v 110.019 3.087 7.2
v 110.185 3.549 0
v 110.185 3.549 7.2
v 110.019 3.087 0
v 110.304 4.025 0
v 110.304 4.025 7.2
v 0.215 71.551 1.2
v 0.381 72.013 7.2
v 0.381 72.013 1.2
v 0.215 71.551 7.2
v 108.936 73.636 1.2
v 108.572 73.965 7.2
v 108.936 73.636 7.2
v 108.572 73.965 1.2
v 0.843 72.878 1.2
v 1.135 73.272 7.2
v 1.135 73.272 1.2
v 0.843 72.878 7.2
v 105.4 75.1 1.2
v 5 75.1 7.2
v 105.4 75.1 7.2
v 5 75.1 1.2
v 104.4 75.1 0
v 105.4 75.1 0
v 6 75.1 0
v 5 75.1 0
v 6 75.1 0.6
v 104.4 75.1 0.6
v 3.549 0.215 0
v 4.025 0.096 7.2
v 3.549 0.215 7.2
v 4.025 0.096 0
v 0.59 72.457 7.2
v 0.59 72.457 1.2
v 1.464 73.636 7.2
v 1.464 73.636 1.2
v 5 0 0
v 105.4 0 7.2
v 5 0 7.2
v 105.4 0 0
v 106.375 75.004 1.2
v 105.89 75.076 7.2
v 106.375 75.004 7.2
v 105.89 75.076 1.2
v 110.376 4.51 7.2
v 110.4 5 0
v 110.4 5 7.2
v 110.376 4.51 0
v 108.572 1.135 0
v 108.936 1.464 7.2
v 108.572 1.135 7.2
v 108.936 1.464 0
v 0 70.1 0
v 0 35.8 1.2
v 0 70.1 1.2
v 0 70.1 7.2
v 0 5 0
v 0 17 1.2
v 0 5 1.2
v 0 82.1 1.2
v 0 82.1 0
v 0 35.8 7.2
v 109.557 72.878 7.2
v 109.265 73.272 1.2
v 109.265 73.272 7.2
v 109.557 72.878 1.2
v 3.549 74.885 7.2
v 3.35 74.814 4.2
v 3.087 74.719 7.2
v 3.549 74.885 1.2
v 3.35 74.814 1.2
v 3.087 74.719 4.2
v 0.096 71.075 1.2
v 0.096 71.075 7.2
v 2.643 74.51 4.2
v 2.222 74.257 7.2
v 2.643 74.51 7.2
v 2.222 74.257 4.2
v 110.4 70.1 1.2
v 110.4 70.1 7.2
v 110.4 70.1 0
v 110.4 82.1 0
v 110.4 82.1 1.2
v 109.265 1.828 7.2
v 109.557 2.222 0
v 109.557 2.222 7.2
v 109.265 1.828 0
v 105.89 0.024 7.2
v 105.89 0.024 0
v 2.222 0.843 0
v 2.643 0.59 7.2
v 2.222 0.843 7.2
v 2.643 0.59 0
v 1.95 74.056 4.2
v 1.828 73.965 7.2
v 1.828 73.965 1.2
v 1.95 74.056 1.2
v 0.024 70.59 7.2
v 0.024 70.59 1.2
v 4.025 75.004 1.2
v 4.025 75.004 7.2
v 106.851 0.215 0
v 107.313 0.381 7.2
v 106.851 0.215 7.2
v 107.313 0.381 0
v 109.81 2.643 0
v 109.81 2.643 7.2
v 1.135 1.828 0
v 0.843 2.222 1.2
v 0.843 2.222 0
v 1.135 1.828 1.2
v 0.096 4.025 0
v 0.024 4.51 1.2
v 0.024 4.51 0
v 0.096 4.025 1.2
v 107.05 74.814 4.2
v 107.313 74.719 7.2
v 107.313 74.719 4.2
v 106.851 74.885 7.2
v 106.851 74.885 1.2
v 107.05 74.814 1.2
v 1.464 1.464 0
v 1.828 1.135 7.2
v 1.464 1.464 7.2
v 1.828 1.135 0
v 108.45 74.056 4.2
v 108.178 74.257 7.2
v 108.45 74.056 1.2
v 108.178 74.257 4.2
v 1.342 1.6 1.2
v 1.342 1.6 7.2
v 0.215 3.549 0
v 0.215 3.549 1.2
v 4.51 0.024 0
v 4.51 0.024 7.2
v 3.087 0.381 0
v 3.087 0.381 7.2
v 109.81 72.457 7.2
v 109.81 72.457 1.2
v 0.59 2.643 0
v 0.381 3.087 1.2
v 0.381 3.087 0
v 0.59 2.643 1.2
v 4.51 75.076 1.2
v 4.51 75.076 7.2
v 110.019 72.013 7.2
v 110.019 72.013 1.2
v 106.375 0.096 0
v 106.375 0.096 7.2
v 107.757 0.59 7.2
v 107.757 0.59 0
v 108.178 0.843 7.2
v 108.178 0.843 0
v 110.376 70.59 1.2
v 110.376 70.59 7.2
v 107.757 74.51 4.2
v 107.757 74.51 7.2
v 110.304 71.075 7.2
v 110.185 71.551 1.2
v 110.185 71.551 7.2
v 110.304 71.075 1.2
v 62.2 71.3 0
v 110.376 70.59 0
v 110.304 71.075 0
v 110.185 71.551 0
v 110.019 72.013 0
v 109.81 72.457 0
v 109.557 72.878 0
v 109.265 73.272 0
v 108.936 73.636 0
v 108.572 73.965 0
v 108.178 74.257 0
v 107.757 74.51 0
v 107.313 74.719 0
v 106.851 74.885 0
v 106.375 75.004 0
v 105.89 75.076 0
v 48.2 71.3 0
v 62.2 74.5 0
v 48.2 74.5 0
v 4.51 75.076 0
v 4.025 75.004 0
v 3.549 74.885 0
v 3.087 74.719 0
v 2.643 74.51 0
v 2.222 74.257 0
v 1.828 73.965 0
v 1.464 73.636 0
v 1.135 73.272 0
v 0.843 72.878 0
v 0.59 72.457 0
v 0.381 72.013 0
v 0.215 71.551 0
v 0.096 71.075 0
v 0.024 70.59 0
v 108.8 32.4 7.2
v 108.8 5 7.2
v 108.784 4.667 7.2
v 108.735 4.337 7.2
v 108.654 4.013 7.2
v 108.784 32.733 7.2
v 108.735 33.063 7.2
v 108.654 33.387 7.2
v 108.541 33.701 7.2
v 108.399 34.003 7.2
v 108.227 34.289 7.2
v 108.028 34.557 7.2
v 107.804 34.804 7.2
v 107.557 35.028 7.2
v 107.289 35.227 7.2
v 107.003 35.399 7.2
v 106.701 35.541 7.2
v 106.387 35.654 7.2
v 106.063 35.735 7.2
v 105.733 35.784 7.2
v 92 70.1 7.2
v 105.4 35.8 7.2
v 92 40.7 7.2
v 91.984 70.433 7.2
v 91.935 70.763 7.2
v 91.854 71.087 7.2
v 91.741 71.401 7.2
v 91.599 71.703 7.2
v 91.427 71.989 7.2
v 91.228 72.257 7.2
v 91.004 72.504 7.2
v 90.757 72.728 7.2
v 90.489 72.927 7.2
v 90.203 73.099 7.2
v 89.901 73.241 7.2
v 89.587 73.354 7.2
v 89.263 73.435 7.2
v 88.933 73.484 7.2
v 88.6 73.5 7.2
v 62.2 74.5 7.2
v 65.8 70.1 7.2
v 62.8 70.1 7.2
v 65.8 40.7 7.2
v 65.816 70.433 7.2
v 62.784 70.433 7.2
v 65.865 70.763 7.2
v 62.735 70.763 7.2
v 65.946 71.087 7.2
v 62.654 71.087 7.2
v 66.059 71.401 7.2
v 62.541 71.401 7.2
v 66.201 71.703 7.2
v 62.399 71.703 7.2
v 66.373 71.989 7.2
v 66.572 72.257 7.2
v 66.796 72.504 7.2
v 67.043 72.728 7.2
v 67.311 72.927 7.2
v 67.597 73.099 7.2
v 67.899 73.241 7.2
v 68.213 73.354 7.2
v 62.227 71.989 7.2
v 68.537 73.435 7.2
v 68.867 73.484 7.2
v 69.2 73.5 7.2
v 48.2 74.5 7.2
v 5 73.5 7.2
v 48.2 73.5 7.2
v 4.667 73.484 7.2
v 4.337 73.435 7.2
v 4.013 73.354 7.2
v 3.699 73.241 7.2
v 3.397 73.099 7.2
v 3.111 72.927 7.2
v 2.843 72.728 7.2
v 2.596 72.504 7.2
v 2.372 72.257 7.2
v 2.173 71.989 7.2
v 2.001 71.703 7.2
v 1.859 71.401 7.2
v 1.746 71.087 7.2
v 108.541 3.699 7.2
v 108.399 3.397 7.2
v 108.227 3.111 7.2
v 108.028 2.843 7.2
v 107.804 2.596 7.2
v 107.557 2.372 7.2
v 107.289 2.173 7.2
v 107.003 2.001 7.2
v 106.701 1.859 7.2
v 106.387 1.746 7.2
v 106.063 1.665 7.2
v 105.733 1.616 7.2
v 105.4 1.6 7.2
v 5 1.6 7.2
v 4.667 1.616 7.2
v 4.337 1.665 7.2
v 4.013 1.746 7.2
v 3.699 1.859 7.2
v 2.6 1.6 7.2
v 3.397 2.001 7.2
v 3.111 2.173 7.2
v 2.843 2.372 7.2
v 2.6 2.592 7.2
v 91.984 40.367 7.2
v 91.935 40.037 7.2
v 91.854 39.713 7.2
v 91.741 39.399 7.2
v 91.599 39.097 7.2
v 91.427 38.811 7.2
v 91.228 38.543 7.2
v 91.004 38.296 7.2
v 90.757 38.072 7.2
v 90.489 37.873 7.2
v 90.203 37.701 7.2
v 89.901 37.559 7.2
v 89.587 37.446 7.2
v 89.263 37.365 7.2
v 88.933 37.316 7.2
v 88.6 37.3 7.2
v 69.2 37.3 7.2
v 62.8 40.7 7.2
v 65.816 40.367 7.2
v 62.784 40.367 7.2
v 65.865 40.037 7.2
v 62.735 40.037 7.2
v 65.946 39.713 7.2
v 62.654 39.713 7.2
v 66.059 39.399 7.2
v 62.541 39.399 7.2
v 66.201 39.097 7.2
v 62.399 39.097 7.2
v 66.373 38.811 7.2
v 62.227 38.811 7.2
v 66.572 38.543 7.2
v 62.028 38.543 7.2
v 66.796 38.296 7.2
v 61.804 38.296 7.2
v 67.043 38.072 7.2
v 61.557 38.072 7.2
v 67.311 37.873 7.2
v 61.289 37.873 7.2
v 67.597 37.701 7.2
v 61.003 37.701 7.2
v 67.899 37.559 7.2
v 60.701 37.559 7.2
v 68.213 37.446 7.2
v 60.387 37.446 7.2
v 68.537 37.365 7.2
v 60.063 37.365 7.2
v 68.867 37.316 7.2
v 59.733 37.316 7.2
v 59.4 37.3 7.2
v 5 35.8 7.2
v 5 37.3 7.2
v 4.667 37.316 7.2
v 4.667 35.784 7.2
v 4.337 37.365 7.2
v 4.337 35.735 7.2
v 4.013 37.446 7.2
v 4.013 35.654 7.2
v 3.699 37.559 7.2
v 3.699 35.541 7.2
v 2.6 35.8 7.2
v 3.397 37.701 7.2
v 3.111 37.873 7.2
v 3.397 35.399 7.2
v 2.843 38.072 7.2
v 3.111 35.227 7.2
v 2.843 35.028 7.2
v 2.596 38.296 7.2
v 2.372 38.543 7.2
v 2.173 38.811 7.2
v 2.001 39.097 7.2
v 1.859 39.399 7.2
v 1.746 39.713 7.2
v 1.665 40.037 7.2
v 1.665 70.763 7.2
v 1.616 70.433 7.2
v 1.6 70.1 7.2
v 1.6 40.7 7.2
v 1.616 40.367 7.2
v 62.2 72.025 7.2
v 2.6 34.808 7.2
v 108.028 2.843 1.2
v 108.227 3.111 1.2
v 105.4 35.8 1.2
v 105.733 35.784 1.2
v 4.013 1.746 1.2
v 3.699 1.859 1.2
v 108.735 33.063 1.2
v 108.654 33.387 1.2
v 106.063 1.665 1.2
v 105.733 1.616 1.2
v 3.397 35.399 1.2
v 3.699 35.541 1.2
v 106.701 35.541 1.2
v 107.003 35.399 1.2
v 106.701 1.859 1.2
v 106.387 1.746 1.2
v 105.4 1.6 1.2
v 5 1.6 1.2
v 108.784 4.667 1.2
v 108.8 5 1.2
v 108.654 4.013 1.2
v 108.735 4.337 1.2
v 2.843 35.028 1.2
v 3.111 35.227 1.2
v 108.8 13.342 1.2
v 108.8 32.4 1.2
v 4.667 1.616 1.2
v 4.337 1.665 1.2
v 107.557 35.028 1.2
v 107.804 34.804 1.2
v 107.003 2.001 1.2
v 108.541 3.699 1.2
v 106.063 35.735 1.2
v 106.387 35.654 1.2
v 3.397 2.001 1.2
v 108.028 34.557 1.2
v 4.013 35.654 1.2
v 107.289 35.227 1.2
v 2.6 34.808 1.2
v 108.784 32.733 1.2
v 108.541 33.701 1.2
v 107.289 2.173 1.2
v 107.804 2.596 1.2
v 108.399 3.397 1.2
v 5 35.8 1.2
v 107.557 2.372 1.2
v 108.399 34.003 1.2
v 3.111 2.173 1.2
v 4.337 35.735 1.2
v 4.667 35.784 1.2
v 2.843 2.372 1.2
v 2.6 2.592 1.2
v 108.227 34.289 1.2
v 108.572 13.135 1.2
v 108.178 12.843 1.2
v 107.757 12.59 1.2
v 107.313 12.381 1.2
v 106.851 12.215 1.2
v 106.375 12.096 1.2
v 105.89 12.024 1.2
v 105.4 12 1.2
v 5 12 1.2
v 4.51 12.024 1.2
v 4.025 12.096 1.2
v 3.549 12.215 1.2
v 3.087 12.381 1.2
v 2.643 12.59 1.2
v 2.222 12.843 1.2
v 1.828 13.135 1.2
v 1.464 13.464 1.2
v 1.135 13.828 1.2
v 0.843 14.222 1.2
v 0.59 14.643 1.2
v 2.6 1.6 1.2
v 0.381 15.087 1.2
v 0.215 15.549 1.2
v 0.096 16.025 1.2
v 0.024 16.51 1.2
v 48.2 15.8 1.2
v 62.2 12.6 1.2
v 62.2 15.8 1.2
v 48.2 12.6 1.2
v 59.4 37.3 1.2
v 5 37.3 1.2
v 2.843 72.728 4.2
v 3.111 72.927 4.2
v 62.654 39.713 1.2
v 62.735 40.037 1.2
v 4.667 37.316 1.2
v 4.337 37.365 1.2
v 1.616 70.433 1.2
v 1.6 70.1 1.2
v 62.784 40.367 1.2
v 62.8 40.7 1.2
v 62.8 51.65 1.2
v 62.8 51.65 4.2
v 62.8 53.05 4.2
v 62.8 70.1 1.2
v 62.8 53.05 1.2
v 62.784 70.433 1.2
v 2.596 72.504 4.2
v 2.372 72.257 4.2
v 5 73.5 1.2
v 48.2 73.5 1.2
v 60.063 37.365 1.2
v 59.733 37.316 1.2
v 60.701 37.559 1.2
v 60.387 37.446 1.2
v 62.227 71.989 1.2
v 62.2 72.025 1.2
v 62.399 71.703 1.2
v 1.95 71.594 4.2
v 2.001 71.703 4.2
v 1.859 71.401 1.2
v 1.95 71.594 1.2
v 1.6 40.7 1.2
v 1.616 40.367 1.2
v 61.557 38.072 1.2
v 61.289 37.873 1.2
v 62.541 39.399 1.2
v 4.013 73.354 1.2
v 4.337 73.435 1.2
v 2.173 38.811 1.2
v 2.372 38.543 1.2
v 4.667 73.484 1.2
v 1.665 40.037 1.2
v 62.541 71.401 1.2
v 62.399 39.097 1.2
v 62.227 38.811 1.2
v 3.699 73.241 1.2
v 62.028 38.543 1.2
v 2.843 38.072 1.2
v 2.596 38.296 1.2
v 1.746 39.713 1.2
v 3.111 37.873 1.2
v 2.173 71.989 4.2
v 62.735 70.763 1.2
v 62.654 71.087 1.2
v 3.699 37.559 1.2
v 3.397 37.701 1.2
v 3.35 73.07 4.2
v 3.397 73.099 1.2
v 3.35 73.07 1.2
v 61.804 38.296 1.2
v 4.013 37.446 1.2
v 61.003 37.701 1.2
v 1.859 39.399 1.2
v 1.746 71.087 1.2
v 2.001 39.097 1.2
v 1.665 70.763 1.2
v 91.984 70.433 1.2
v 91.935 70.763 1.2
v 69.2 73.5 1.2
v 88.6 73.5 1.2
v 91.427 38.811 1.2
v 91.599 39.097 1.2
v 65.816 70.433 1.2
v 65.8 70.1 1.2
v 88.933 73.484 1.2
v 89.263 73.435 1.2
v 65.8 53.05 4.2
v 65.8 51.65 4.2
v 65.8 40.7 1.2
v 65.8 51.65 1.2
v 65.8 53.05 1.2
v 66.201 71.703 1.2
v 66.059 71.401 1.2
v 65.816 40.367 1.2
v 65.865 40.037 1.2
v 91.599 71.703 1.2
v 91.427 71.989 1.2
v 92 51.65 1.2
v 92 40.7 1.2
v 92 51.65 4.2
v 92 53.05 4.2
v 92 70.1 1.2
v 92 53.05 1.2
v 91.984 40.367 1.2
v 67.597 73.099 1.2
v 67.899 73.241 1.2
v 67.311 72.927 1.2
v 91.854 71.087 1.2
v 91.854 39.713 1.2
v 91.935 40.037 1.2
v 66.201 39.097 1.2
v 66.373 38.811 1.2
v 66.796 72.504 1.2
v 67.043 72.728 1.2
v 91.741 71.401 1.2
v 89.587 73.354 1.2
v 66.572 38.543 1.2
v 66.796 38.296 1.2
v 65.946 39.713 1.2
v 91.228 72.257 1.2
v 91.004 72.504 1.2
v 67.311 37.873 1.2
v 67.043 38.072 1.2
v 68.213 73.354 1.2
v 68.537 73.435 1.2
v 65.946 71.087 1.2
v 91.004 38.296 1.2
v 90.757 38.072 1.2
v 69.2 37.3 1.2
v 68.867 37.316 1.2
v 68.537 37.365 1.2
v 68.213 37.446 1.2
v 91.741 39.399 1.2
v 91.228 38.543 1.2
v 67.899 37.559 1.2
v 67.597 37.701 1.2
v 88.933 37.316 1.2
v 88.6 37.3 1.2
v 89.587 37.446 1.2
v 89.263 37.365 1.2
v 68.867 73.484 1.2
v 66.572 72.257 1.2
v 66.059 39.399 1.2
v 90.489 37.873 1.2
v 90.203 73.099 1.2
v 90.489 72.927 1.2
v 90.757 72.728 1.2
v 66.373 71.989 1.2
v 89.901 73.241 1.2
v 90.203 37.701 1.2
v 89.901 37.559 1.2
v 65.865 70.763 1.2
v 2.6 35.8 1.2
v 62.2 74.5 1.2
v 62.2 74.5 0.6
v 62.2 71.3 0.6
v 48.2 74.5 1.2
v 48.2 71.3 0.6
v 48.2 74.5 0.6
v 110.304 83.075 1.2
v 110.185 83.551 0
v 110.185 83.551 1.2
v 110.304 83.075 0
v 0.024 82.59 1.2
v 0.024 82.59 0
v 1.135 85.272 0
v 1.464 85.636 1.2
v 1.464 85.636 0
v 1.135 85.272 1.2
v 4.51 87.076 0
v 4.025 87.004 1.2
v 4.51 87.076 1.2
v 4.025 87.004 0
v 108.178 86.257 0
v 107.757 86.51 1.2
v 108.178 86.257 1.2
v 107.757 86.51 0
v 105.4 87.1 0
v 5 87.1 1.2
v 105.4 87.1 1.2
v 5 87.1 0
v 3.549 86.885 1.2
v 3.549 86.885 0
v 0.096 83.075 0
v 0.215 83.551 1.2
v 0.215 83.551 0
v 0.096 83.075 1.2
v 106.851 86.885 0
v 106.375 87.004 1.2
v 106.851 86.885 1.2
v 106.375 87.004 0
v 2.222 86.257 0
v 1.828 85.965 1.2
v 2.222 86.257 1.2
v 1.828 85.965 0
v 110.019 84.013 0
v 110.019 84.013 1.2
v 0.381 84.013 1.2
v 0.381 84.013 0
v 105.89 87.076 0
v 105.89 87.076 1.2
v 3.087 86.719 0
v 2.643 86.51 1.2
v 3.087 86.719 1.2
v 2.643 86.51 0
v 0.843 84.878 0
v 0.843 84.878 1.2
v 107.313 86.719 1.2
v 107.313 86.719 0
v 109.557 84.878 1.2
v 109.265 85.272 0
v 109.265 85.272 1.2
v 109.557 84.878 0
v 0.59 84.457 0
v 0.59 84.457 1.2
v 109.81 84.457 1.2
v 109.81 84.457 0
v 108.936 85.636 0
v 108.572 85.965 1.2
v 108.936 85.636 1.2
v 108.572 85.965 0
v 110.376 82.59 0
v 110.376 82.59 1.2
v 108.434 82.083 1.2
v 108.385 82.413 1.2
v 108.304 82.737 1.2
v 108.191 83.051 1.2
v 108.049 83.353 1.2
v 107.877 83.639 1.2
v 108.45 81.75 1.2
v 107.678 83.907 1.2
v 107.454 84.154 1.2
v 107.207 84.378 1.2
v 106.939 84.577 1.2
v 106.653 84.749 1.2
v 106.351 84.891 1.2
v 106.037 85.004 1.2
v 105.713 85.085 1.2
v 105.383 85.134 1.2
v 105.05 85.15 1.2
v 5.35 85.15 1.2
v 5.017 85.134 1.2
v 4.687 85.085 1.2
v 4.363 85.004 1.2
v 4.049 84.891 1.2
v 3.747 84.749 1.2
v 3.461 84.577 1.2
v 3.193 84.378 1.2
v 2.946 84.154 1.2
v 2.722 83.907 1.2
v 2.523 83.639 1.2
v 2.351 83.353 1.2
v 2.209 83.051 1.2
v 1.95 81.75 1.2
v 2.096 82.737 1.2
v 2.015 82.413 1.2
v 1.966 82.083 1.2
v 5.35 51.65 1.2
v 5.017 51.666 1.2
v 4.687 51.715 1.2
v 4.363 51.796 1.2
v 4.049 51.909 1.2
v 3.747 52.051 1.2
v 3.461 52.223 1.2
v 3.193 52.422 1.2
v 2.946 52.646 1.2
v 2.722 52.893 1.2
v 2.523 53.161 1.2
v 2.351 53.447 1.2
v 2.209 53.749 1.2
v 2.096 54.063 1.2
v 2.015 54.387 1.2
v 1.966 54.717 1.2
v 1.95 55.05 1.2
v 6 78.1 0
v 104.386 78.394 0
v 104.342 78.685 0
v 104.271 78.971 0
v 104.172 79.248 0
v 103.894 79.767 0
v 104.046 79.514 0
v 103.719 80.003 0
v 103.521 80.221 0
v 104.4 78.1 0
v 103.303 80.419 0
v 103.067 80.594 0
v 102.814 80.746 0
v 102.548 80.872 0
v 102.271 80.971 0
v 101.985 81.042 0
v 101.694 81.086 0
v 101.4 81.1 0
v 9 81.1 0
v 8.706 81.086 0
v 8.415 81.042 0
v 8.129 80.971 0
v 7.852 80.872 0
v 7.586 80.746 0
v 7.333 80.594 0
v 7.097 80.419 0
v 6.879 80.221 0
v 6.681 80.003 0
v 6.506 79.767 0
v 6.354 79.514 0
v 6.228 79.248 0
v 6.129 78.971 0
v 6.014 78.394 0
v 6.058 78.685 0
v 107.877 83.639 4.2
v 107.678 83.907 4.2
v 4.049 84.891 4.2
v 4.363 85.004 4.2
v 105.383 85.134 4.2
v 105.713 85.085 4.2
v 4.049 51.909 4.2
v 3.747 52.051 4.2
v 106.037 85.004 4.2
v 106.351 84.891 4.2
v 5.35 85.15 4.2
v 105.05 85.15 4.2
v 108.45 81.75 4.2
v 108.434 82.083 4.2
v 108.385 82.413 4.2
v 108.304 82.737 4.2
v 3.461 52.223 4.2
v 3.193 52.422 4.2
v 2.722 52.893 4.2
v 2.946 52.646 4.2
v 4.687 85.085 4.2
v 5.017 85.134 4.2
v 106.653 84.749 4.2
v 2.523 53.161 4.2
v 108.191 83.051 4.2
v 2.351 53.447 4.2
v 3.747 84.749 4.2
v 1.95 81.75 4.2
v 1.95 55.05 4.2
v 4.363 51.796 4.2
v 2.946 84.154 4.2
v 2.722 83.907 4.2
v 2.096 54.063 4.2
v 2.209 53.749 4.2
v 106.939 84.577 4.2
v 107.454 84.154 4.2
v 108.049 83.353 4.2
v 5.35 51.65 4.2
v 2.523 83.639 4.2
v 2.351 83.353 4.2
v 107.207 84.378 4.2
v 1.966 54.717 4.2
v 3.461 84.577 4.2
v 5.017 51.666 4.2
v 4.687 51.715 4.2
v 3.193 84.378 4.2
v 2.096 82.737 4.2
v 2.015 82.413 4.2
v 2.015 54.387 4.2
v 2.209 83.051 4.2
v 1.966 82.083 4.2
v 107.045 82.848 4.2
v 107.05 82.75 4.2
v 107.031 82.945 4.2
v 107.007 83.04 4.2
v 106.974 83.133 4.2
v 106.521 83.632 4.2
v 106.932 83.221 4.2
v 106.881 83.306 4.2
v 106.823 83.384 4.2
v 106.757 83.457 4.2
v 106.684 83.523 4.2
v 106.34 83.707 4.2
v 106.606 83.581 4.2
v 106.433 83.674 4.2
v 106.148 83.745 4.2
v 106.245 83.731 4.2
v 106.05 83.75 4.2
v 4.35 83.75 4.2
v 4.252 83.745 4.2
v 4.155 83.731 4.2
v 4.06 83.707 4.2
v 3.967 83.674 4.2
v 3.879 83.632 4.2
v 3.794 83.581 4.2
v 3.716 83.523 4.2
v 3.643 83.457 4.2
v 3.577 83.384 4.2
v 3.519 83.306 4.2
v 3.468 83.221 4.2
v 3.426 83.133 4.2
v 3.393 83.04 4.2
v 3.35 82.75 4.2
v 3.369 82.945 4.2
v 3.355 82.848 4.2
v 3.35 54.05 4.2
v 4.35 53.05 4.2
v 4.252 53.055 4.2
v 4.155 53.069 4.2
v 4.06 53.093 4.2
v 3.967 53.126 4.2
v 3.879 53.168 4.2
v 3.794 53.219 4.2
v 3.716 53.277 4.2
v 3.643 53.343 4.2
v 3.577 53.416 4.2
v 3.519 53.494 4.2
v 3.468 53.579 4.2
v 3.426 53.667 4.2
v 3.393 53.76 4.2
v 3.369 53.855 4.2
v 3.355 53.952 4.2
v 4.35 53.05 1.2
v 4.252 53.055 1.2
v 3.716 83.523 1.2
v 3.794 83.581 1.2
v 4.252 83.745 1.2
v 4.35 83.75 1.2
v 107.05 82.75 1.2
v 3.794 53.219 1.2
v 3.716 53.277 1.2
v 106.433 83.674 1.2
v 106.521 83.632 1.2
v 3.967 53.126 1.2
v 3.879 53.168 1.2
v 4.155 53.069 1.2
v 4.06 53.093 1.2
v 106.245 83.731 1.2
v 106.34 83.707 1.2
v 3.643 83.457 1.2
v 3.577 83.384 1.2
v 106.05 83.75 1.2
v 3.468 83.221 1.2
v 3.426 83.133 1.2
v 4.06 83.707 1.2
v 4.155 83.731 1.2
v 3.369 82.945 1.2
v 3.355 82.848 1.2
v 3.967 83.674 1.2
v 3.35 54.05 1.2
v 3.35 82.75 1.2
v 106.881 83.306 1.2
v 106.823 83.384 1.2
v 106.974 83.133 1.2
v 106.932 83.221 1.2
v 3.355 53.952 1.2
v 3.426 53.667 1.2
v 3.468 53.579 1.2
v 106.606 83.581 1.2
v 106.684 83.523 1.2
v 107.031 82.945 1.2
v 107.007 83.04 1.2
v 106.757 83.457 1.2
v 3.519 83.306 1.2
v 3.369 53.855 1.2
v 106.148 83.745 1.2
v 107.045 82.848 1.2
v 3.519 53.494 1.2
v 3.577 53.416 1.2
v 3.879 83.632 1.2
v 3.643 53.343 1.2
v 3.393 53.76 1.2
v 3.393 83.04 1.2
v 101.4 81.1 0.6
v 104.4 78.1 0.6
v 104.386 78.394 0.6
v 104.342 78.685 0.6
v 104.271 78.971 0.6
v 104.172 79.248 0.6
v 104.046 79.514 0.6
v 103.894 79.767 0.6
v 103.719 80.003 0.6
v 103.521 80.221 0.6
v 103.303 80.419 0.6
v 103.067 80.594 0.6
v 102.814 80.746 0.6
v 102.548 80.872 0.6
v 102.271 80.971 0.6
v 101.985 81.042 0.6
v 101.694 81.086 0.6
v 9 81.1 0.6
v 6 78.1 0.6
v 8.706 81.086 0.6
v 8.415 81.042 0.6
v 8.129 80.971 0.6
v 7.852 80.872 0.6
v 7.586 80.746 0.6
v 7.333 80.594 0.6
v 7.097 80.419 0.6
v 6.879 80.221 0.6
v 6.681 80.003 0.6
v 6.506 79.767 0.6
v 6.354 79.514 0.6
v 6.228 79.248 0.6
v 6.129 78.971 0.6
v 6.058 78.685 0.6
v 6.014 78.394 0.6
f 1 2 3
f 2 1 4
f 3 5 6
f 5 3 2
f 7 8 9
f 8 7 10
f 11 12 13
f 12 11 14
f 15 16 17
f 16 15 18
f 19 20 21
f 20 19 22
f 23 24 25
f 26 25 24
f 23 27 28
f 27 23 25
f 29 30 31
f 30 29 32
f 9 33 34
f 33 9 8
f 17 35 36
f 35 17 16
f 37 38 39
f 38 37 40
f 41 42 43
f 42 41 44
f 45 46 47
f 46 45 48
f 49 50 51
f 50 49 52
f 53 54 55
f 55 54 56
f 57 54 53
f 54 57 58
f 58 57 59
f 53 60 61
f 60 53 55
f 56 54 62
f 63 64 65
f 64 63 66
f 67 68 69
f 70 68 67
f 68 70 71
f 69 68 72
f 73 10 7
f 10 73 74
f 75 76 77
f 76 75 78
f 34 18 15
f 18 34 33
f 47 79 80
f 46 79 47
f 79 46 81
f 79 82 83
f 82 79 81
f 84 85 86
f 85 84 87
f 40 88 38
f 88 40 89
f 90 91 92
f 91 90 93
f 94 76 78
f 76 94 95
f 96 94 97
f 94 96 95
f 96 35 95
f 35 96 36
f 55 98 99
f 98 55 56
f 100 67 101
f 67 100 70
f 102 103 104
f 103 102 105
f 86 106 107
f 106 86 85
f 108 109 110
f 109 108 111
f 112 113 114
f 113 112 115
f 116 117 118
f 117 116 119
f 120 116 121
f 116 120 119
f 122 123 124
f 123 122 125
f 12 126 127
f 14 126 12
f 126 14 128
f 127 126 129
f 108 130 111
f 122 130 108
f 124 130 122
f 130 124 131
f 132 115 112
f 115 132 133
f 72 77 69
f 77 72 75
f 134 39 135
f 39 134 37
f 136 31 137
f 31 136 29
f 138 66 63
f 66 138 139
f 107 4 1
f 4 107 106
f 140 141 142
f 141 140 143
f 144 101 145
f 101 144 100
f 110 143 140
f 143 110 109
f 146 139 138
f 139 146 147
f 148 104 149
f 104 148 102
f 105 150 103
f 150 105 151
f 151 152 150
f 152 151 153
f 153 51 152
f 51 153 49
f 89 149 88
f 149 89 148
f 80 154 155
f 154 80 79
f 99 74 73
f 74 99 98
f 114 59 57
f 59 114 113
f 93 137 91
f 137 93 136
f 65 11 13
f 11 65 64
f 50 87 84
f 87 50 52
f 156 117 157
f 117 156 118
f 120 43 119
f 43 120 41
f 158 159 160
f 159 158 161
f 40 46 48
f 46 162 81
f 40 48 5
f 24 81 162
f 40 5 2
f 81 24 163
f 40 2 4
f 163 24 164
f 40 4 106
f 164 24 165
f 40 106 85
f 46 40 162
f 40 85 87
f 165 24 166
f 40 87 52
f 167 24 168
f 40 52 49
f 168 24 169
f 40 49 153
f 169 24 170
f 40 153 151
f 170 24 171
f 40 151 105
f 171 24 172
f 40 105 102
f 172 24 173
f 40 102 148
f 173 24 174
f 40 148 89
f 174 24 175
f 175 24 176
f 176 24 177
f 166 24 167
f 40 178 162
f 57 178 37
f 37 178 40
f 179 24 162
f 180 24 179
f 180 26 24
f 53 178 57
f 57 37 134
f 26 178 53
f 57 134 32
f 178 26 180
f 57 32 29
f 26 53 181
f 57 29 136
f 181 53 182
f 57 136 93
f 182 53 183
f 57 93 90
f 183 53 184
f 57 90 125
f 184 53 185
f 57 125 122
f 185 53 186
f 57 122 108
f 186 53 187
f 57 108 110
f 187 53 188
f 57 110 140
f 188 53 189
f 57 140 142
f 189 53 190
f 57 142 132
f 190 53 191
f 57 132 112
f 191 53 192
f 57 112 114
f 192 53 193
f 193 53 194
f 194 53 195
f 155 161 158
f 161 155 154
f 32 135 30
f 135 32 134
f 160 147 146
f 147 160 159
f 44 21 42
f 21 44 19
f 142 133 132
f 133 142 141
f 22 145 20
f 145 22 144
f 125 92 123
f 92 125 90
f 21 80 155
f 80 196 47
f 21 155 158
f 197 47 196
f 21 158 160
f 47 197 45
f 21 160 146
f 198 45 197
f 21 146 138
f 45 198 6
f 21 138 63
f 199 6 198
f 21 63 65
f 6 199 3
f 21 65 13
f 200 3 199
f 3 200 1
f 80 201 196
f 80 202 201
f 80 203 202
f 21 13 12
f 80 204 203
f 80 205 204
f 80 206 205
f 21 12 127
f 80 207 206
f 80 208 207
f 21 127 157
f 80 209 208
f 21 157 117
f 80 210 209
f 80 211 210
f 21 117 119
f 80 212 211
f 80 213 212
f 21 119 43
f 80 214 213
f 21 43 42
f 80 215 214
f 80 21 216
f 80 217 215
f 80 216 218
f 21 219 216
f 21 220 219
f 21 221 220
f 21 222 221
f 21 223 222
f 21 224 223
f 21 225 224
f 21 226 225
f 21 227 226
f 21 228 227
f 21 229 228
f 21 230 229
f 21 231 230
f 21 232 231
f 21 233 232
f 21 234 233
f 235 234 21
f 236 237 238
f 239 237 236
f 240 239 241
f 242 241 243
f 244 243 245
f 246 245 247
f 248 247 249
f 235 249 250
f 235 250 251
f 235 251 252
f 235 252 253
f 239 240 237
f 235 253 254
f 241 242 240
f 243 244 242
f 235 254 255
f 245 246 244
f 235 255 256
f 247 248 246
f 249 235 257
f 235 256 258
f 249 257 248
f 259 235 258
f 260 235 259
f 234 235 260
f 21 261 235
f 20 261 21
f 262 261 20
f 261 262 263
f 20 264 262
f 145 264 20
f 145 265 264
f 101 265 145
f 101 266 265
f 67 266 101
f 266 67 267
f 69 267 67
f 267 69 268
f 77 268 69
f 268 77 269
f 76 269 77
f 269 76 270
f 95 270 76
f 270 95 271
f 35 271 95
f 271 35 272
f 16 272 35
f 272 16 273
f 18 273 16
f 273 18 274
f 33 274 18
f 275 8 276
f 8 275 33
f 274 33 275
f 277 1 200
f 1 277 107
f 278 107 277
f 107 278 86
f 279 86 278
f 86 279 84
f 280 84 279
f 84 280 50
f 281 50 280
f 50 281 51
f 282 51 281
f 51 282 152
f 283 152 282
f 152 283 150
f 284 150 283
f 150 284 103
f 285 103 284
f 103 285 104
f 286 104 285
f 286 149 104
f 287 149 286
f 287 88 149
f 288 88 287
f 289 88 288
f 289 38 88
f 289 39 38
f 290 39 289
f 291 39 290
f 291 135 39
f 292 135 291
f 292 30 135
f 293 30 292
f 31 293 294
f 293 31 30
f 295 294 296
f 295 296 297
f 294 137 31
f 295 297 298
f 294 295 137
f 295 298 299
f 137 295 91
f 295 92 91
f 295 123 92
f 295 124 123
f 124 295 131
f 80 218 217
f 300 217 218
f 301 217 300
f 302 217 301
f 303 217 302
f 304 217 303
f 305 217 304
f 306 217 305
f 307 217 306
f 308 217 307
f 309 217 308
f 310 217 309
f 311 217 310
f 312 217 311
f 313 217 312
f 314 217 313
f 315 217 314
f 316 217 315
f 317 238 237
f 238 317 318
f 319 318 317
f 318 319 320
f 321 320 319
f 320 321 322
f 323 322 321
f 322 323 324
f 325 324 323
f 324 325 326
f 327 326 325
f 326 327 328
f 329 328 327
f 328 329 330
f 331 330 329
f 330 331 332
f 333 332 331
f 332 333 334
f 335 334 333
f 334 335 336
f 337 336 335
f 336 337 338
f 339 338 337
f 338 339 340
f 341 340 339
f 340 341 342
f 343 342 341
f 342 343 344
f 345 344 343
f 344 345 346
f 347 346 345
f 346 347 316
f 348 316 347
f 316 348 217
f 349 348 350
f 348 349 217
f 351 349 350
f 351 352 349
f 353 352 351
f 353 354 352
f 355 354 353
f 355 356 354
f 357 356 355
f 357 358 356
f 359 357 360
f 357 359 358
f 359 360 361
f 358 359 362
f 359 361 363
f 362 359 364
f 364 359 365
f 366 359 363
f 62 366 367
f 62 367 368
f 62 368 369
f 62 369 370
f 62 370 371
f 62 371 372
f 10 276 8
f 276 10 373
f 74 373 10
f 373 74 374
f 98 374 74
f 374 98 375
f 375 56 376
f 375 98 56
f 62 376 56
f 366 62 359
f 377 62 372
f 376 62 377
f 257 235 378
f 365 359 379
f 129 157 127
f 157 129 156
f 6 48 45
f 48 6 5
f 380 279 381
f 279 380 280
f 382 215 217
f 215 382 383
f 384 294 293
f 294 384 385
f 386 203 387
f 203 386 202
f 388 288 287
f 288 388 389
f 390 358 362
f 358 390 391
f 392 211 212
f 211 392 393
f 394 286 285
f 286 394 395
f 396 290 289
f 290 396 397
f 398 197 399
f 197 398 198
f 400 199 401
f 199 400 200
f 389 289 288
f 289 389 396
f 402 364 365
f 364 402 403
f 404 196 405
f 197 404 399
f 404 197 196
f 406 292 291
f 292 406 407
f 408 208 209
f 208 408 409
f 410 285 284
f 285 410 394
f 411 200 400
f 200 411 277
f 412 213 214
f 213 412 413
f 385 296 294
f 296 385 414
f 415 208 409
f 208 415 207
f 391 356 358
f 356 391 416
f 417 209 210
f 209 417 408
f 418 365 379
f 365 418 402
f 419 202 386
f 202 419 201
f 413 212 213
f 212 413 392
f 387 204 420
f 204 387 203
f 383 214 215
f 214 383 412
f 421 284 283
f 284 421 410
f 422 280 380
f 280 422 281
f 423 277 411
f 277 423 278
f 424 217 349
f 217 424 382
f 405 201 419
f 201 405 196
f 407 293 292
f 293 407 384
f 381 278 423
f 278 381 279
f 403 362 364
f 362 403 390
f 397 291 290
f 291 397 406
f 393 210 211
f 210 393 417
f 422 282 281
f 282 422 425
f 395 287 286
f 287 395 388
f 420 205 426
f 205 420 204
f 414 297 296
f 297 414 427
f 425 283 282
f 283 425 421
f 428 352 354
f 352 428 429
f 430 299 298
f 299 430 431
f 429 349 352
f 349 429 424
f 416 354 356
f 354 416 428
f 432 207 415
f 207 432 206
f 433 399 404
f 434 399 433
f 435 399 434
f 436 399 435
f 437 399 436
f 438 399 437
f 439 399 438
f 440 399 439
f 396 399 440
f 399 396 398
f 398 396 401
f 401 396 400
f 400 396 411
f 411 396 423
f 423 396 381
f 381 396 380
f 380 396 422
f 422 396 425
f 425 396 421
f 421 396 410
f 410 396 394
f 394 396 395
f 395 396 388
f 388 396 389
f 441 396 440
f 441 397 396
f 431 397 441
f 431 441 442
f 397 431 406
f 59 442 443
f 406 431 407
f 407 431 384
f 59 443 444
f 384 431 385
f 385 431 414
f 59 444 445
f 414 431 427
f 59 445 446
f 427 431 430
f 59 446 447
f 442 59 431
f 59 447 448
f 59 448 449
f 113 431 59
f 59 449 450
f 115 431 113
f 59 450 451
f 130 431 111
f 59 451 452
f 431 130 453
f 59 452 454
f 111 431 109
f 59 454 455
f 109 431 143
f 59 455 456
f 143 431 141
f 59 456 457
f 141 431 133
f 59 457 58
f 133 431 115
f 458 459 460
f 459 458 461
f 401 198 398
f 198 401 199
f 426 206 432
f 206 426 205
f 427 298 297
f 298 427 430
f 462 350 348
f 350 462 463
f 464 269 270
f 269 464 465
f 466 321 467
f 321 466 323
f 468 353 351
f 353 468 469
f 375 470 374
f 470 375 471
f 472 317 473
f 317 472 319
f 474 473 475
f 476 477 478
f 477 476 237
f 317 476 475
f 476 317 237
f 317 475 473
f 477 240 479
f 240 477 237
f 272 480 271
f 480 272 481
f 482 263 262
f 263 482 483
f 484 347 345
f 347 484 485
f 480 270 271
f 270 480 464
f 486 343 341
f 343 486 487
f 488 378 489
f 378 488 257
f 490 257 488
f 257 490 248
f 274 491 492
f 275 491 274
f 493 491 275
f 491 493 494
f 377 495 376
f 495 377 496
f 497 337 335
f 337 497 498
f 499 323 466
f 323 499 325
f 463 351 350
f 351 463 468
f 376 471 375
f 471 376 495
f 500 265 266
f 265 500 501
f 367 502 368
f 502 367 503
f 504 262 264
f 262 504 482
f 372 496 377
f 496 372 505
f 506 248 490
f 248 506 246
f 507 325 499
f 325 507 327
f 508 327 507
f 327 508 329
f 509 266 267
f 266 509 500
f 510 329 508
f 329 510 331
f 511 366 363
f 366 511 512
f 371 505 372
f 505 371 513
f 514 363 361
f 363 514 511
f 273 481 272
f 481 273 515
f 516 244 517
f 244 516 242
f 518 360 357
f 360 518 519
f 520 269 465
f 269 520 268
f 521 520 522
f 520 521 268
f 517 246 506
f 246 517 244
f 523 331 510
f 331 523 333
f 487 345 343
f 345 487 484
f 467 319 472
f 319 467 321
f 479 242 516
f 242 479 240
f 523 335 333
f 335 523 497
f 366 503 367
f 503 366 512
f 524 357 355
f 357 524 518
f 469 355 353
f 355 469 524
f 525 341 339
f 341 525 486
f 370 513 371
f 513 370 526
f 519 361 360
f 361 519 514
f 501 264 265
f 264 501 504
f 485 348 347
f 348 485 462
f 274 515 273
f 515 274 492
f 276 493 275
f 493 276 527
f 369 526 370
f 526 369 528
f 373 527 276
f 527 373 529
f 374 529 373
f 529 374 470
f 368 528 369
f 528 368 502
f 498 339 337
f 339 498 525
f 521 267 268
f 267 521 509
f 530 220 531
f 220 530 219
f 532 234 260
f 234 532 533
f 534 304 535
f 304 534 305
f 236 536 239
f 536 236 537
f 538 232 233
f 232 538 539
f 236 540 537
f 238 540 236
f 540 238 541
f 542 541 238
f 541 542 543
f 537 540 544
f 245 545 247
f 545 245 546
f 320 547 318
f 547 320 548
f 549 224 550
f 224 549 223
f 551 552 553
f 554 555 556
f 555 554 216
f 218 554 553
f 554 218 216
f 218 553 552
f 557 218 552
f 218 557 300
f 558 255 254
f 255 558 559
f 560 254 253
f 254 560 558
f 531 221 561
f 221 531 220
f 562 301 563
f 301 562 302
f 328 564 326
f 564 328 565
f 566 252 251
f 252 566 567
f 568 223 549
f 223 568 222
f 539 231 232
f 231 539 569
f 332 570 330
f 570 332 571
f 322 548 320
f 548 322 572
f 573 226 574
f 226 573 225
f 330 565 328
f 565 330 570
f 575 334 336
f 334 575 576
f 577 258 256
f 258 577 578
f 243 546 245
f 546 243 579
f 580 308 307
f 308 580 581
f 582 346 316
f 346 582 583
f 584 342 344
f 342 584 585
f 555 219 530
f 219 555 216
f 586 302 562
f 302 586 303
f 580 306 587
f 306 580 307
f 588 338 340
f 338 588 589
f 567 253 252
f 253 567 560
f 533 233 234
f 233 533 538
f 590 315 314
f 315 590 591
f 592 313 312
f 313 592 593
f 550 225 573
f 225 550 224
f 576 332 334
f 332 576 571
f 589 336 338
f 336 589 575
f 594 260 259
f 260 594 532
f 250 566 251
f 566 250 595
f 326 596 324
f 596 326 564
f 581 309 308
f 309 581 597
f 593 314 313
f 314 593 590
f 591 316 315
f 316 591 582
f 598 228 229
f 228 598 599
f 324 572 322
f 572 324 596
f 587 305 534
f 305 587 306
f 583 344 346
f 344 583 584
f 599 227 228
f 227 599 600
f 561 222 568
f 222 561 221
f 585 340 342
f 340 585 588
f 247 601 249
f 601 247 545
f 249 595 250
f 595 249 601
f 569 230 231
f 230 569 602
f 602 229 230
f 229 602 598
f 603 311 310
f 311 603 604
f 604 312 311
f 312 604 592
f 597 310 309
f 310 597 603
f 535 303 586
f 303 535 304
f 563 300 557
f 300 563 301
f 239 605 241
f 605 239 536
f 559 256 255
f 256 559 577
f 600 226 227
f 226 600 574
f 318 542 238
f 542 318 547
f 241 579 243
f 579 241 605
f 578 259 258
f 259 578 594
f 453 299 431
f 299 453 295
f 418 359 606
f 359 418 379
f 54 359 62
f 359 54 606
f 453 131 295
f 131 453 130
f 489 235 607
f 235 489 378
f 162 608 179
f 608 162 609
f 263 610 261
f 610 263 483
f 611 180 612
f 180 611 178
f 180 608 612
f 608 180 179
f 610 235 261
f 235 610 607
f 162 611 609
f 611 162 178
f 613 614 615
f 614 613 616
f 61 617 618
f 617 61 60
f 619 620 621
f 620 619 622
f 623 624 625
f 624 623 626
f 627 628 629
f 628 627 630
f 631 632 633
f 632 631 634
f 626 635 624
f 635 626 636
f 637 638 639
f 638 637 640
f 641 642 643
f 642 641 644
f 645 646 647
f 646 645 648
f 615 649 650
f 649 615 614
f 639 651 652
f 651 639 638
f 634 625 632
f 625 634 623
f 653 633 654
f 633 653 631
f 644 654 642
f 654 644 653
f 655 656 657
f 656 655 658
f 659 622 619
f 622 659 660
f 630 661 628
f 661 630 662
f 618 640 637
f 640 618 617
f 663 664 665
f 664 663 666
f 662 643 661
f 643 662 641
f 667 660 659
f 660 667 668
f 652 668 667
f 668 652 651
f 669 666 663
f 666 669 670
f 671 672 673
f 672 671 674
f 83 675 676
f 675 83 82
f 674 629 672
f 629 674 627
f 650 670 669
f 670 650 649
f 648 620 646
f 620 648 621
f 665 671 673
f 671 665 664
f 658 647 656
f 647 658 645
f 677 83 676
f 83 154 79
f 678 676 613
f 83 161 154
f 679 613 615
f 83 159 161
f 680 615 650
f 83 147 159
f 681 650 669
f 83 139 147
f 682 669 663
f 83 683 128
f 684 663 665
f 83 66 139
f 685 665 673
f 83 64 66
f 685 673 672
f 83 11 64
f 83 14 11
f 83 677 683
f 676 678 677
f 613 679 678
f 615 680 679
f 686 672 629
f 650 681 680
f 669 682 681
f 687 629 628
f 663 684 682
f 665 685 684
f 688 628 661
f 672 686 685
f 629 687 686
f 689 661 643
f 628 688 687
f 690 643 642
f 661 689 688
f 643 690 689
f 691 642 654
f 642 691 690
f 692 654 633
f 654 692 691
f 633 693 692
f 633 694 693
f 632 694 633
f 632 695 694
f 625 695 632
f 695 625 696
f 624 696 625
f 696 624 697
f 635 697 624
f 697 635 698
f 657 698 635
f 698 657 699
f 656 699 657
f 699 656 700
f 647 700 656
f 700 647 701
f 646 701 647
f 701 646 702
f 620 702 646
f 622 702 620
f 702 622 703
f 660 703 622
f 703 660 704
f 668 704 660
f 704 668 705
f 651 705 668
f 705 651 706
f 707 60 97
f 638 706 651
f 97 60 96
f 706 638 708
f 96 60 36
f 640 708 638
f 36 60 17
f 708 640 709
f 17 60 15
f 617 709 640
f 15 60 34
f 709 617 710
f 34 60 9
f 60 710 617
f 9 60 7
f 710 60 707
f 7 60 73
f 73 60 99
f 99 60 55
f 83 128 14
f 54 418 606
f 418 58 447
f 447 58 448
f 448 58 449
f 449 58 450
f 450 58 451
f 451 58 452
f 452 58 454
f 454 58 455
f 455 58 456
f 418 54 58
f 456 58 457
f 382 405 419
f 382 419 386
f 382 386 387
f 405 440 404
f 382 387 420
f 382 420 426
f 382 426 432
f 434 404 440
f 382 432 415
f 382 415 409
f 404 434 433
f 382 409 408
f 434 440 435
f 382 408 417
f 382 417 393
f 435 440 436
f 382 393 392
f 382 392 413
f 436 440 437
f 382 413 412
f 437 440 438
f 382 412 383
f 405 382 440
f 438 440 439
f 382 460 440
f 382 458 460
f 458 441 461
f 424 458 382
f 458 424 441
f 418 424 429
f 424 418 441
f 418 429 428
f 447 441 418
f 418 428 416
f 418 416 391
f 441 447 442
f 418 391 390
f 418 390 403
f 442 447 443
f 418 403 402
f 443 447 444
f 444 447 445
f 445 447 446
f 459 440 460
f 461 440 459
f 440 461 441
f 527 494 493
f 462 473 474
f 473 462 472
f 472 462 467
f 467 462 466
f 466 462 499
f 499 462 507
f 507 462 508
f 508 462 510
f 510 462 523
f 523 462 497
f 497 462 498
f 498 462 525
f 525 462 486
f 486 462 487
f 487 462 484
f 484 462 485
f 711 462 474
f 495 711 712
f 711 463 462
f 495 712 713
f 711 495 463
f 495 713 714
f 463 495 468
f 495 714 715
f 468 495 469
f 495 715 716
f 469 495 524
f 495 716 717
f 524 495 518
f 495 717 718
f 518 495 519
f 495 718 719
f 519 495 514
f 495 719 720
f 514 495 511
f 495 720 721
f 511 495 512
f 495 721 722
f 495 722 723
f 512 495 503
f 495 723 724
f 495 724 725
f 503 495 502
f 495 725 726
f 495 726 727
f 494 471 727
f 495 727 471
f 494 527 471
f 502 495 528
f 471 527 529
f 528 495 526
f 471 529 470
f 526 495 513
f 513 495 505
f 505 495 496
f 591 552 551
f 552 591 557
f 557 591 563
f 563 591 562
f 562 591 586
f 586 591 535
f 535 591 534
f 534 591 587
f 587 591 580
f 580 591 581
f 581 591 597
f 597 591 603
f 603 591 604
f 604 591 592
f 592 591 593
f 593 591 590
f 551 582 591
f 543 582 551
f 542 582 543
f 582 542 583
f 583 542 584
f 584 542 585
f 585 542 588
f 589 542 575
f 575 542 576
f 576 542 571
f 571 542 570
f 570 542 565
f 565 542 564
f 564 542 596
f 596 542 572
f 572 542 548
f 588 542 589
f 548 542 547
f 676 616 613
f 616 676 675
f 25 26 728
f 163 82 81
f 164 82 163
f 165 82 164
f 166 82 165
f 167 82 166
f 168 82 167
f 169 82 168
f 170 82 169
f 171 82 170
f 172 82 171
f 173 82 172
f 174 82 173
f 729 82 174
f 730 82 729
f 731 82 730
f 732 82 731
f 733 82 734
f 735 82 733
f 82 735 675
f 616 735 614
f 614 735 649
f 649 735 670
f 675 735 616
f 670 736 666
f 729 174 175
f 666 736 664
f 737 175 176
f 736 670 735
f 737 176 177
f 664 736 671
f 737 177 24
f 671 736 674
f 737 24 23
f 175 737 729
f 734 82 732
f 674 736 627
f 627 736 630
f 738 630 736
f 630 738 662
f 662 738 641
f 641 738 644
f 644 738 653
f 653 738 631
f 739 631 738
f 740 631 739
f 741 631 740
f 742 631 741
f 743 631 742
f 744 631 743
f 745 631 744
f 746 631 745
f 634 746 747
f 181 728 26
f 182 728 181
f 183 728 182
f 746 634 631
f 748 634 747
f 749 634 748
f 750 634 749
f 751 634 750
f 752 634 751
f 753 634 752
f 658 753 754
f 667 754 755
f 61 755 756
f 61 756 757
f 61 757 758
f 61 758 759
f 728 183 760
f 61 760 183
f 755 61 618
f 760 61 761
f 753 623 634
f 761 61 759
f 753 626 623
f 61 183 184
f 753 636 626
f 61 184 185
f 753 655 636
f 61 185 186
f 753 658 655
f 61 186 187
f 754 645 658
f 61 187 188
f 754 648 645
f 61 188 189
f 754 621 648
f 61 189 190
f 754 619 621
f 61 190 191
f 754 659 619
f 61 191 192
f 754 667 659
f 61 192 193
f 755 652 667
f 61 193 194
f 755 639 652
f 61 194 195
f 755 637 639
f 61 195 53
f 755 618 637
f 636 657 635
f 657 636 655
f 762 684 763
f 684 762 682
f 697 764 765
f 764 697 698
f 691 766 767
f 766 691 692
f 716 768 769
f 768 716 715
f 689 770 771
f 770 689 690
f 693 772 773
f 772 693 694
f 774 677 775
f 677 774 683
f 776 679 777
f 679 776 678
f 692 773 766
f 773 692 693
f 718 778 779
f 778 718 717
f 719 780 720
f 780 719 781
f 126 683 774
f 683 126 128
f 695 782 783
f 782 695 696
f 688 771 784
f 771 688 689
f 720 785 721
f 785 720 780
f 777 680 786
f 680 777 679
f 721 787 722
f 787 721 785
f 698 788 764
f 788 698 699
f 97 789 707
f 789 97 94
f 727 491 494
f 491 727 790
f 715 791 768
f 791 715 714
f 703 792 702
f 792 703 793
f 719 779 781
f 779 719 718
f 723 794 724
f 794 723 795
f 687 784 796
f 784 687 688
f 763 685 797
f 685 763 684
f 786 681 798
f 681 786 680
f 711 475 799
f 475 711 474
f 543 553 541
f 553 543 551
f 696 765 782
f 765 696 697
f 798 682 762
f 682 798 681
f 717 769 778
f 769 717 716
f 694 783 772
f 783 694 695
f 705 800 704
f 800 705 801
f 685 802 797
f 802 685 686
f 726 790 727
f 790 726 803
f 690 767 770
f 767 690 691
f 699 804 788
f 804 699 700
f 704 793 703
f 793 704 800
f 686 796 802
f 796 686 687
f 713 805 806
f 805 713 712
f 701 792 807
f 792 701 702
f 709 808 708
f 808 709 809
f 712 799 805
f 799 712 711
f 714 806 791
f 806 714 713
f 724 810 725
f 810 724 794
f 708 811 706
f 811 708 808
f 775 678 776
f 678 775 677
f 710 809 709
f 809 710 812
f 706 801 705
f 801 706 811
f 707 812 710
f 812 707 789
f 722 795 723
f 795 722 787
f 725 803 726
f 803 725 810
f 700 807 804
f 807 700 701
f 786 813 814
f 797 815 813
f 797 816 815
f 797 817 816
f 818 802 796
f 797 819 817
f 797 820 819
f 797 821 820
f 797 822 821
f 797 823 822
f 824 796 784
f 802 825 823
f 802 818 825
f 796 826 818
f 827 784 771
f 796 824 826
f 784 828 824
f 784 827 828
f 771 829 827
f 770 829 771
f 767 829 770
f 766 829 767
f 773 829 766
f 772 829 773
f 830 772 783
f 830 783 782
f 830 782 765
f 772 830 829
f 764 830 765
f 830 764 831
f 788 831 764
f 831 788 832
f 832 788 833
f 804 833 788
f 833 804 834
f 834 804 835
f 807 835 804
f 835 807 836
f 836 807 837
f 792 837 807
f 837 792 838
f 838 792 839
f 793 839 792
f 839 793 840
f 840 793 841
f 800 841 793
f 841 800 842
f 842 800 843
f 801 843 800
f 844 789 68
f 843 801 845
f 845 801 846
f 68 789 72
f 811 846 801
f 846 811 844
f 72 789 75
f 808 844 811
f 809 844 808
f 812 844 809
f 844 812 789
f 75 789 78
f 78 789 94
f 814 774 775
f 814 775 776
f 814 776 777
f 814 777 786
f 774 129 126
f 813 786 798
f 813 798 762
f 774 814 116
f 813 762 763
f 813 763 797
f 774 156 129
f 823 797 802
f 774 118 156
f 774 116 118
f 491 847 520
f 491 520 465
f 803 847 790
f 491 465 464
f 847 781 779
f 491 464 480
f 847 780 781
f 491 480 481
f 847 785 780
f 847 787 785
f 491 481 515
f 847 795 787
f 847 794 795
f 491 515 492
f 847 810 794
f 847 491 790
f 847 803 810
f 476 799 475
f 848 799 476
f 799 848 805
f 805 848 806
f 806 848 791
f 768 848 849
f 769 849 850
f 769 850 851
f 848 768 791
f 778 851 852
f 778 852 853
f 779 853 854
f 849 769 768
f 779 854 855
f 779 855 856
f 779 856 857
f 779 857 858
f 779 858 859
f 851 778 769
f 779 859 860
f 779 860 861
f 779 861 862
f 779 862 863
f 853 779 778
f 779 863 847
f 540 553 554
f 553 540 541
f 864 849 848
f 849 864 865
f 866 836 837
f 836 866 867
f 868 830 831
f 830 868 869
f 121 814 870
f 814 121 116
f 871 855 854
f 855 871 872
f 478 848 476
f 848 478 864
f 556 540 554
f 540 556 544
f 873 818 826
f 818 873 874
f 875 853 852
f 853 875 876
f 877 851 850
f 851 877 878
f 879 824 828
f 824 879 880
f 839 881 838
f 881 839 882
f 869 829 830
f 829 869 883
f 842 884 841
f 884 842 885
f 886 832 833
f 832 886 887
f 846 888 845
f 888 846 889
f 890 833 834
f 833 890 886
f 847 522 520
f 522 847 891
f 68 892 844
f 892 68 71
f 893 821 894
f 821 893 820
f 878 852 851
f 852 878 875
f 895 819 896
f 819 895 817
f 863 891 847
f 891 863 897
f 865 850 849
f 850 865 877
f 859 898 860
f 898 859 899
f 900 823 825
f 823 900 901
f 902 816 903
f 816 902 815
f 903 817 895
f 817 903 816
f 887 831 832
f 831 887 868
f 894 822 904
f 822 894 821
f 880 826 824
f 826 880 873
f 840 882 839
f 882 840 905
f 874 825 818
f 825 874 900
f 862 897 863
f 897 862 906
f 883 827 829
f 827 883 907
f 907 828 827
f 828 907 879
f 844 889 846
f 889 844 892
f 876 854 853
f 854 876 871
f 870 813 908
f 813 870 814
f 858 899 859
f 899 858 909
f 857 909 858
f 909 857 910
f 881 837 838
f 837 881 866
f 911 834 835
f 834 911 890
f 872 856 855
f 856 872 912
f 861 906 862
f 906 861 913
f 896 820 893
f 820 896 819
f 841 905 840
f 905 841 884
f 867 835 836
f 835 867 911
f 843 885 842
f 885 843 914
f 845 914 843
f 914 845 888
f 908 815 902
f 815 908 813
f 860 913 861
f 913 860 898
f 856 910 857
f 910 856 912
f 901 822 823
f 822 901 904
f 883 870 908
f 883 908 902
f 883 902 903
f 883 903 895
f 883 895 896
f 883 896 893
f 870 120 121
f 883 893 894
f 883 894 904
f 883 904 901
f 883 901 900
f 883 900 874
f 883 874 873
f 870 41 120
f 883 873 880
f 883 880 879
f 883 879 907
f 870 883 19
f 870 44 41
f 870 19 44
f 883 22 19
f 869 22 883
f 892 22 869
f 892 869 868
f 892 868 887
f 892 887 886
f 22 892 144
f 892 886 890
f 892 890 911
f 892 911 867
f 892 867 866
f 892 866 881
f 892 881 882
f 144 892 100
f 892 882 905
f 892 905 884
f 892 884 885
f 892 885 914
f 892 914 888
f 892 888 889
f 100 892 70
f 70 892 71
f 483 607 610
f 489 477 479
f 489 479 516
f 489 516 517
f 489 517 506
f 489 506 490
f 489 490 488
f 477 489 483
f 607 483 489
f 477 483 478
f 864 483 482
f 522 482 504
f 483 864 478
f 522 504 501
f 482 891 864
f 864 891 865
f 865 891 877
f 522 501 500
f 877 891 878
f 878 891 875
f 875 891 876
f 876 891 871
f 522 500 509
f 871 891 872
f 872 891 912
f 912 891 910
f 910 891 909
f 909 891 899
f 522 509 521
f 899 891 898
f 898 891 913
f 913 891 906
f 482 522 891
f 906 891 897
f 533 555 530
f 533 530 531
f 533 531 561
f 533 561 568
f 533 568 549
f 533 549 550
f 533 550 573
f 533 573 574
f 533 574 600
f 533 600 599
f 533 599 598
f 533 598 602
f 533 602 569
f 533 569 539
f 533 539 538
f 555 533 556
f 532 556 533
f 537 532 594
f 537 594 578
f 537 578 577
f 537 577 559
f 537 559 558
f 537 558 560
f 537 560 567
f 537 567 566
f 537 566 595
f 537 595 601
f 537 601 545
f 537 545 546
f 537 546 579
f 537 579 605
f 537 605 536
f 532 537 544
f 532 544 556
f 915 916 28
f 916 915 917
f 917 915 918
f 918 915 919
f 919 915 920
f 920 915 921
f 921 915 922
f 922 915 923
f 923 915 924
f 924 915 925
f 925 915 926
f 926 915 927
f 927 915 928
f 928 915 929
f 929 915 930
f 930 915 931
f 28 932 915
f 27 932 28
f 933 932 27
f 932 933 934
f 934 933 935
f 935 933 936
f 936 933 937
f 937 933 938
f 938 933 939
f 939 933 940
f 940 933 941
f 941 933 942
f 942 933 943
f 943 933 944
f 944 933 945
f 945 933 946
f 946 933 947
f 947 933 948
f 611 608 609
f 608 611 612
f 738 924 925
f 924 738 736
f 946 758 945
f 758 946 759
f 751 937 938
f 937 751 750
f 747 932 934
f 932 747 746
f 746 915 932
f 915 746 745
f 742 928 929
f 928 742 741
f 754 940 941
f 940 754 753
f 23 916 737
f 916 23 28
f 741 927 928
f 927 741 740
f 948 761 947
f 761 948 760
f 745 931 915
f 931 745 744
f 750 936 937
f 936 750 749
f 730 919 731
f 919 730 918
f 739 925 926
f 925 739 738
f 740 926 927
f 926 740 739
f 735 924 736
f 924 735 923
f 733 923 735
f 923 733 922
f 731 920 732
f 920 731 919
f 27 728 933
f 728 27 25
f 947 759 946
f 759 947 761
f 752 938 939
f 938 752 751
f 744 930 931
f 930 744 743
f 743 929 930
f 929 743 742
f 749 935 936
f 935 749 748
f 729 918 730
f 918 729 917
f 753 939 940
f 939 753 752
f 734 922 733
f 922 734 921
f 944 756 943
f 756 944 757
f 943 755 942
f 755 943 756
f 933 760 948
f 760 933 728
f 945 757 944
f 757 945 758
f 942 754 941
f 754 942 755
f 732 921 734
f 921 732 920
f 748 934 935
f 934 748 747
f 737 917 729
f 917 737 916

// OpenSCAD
// ============================================================================
// SIID-01 — flat ID-CARD style enclosure for the LilyGO T-A7670E
//
// Layout is SIDE-BY-SIDE, not stacked: the board sits in one bay and the flat
// LiPo lies beside it in a second bay. Nothing is on top of anything else, so
// the whole card is only as thick as its tallest single part (~8-9 mm) instead
// of the ~15 mm a stacked design forces.
//
//    +-------------------------------------------------+
//    |  [ LilyGO T-A7670E board ................... ]  |  <- bay A
//   <-  open end                                       |
//    |  [ flat LiPo ........... ] [ GPS patch ]        |  <- bay B
//    +-------------------------------------------------+
//     ^ this end is OPEN across the board bay, so the board's own
//       Type-C port is reachable. No other holes in the shell.
//
// Open in OpenSCAD (free - openscad.org):
//   part="tray" -> F6 -> File > Export > Export as STL
//   part="lid"  -> F6 -> export
//   part="both" -> F5 to preview them side by side
//
// SIZE REALITY CHECK: the board itself is ~106 mm long, so the finished card
// cannot be smaller than that. It comes out 110.4 x 75.1 mm with the defaults - bigger than a
// credit card (85.6 x 54), but FLAT and card-shaped, worn on a lanyard.
// ============================================================================

/* ================= MEASURE THESE BEFORE PRINTING =================
   [ ] board length / width / height (height = tallest component on it)
   [ ] flat LiPo length / width / thickness
   [ ] GPS patch antenna size
   A case 1 mm too small is wasted plastic. Trust your caliper.

   No USB measurement needed: the charging end of the board bay is left open,
   so the port lines up whatever its exact position.
   ================================================================= */

// -------------------- PARTS --------------------
part          = "both";     // "tray" | "lid" | "both"

// --- LilyGO T-A7670E board (18650 holder removed) ---
board_l       = 106;
board_w       = 33;
board_h       = 6;          // board + tallest component + solder tails

// --- flat LiPo, lying BESIDE the board ---
batt_l        = 60;
batt_w        = 35;
batt_h        = 5;

// --- GPS ceramic patch antenna (sits beside the battery, facing UP) ---
gps_l         = 25;
gps_w         = 25;
gps_h         = 4;

// The flat LTE film antenna is adhesive - stick it inside the lid. It is thin
// enough that it needs no cavity of its own.

// -------------------- FIT & SHELL --------------------
clear         = 0.6;        // slack around each part so it drops in
wall          = 1.6;        // side wall thickness
floor_t       = 1.2;        // base thickness
lid_t         = 1.2;        // lid thickness
divider       = 1.5;        // rib between the two bays
corner_r      = 5;          // card corner radius (a real ID card is ~3.2)

lid_lip_h     = 3;          // depth the lid plug sinks in
lid_clear     = 0.35;       // lid fit slack; raise to ~0.45 if too tight

// -------------------- OPENINGS --------------------
// The charging end of the board bay is left completely OPEN rather than having a
// window cut in it: the Type-C port is mounted on the board's edge, so an open
// end means the cable plugs straight in with no alignment to get wrong.
// Both aerials live INSIDE the card (GPS patch in its own bay, flat LTE film
// stuck to the inside of the lid), so there are no cable exits and no other
// holes anywhere in the shell.
open_end      = true;       // leave the charging end of the board bay open

lanyard       = true;
lanyard_w     = 14;         // lanyard SLOT width (a slot, like a real ID card)
lanyard_h     = 3.2;        // slot height

label_recess  = true;       // shallow recess on the lid for a printed ID insert
label_depth   = 0.6;
label_margin  = 6;

$fn           = 64;

// -------------------- DERIVED --------------------
bayA_w   = board_w + 2*clear;                 // board bay
bayB_w   = max(batt_w, gps_w) + 2*clear;      // battery + GPS bay
inner_x  = max(board_l, batt_l + gps_l + 3) + 2*clear;
inner_y  = bayA_w + divider + bayB_w;
inner_z  = max(board_h, batt_h, gps_h);       // <- the card's thickness driver

outer_x  = inner_x + 2*wall;
outer_y  = inner_y + 2*wall;
tray_h   = floor_t + inner_z;
total_h  = tray_h + lid_t;
inner_r  = max(0.8, corner_r - wall);

// rounded rectangular prism with a corner at the origin
module rbox(x, y, z, r) {
  hull() for (i = [r, x-r], j = [r, y-r])
    translate([i, j, 0]) cylinder(r = r, h = z);
}

module tray() {
  difference() {
    rbox(outer_x, outer_y, tray_h, corner_r);

    // --- bay A: the board ---
    translate([wall, wall, floor_t])
      rbox(inner_x, bayA_w, inner_z + 1, inner_r);

    // --- bay B: flat LiPo ---
    translate([wall, wall + bayA_w + divider, floor_t])
      rbox(batt_l + 2*clear, bayB_w, inner_z + 1, inner_r);

    // --- bay B continued: GPS patch antenna, beside the battery ---
    translate([wall + batt_l + 2*clear + 3, wall + bayA_w + divider, floor_t])
      rbox(gps_l + 2*clear, bayB_w, inner_z + 1, inner_r);

    // --- charging end left fully open across the board bay ---
    // The whole end wall is removed over bay A, so the board's own Type-C port
    // is reachable no matter exactly where it sits along that edge.
    if (open_end)
      translate([-1, wall, floor_t])
        cube([wall + 2, bayA_w, inner_z + 1]);

    // --- lanyard slot, like a real ID card (top edge, centred) ---
    if (lanyard)
      translate([outer_x/2 - lanyard_w/2, outer_y - wall/2 - lanyard_h/2 - 1.4, -1])
        cube([lanyard_w, lanyard_h, tray_h + 2]);
  }
}

module lid() {
  difference() {
    union() {
      rbox(outer_x, outer_y, lid_t, corner_r);
      // plug lip that drops into bay A only (bay B stays clear for the battery)
      translate([wall + lid_clear, wall + lid_clear, -lid_lip_h])
        rbox(inner_x - 2*lid_clear, bayA_w - 2*lid_clear, lid_lip_h + 0.01, inner_r);
    }
    // hollow the lip to save plastic
    translate([wall + lid_clear + 1.4, wall + lid_clear + 1.4, -lid_lip_h])
      rbox(inner_x - 2*lid_clear - 2.8, bayA_w - 2*lid_clear - 2.8, lid_lip_h, 1);

    // shallow recess on the face for a printed ID insert (name, photo, reg no)
    if (label_recess)
      translate([label_margin, label_margin, lid_t - label_depth])
        rbox(outer_x - 2*label_margin, outer_y - 2*label_margin, label_depth + 1, 3);

    // matching lanyard slot
    if (lanyard)
      translate([outer_x/2 - lanyard_w/2, outer_y - wall/2 - lanyard_h/2 - 1.4, -1])
        cube([lanyard_w, lanyard_h, lid_t + 2]);
  }
}

// -------------------- OUTPUT --------------------
if (part == "tray") tray();
else if (part == "lid") translate([0, 0, lid_t]) rotate([180, 0, 0]) lid();
else {
  tray();
  translate([0, outer_y + 12, lid_t]) rotate([180, 0, 0]) lid();
}

echo(str("CARD SIZE: ", outer_x, " x ", outer_y, " x ", total_h, " mm"));
echo(str("(a credit card is 85.6 x 54 x 0.76 mm - the board alone is ", board_l, " mm long)"));
echo(str("Thickness is set by the tallest single part: ", inner_z, " mm"));
